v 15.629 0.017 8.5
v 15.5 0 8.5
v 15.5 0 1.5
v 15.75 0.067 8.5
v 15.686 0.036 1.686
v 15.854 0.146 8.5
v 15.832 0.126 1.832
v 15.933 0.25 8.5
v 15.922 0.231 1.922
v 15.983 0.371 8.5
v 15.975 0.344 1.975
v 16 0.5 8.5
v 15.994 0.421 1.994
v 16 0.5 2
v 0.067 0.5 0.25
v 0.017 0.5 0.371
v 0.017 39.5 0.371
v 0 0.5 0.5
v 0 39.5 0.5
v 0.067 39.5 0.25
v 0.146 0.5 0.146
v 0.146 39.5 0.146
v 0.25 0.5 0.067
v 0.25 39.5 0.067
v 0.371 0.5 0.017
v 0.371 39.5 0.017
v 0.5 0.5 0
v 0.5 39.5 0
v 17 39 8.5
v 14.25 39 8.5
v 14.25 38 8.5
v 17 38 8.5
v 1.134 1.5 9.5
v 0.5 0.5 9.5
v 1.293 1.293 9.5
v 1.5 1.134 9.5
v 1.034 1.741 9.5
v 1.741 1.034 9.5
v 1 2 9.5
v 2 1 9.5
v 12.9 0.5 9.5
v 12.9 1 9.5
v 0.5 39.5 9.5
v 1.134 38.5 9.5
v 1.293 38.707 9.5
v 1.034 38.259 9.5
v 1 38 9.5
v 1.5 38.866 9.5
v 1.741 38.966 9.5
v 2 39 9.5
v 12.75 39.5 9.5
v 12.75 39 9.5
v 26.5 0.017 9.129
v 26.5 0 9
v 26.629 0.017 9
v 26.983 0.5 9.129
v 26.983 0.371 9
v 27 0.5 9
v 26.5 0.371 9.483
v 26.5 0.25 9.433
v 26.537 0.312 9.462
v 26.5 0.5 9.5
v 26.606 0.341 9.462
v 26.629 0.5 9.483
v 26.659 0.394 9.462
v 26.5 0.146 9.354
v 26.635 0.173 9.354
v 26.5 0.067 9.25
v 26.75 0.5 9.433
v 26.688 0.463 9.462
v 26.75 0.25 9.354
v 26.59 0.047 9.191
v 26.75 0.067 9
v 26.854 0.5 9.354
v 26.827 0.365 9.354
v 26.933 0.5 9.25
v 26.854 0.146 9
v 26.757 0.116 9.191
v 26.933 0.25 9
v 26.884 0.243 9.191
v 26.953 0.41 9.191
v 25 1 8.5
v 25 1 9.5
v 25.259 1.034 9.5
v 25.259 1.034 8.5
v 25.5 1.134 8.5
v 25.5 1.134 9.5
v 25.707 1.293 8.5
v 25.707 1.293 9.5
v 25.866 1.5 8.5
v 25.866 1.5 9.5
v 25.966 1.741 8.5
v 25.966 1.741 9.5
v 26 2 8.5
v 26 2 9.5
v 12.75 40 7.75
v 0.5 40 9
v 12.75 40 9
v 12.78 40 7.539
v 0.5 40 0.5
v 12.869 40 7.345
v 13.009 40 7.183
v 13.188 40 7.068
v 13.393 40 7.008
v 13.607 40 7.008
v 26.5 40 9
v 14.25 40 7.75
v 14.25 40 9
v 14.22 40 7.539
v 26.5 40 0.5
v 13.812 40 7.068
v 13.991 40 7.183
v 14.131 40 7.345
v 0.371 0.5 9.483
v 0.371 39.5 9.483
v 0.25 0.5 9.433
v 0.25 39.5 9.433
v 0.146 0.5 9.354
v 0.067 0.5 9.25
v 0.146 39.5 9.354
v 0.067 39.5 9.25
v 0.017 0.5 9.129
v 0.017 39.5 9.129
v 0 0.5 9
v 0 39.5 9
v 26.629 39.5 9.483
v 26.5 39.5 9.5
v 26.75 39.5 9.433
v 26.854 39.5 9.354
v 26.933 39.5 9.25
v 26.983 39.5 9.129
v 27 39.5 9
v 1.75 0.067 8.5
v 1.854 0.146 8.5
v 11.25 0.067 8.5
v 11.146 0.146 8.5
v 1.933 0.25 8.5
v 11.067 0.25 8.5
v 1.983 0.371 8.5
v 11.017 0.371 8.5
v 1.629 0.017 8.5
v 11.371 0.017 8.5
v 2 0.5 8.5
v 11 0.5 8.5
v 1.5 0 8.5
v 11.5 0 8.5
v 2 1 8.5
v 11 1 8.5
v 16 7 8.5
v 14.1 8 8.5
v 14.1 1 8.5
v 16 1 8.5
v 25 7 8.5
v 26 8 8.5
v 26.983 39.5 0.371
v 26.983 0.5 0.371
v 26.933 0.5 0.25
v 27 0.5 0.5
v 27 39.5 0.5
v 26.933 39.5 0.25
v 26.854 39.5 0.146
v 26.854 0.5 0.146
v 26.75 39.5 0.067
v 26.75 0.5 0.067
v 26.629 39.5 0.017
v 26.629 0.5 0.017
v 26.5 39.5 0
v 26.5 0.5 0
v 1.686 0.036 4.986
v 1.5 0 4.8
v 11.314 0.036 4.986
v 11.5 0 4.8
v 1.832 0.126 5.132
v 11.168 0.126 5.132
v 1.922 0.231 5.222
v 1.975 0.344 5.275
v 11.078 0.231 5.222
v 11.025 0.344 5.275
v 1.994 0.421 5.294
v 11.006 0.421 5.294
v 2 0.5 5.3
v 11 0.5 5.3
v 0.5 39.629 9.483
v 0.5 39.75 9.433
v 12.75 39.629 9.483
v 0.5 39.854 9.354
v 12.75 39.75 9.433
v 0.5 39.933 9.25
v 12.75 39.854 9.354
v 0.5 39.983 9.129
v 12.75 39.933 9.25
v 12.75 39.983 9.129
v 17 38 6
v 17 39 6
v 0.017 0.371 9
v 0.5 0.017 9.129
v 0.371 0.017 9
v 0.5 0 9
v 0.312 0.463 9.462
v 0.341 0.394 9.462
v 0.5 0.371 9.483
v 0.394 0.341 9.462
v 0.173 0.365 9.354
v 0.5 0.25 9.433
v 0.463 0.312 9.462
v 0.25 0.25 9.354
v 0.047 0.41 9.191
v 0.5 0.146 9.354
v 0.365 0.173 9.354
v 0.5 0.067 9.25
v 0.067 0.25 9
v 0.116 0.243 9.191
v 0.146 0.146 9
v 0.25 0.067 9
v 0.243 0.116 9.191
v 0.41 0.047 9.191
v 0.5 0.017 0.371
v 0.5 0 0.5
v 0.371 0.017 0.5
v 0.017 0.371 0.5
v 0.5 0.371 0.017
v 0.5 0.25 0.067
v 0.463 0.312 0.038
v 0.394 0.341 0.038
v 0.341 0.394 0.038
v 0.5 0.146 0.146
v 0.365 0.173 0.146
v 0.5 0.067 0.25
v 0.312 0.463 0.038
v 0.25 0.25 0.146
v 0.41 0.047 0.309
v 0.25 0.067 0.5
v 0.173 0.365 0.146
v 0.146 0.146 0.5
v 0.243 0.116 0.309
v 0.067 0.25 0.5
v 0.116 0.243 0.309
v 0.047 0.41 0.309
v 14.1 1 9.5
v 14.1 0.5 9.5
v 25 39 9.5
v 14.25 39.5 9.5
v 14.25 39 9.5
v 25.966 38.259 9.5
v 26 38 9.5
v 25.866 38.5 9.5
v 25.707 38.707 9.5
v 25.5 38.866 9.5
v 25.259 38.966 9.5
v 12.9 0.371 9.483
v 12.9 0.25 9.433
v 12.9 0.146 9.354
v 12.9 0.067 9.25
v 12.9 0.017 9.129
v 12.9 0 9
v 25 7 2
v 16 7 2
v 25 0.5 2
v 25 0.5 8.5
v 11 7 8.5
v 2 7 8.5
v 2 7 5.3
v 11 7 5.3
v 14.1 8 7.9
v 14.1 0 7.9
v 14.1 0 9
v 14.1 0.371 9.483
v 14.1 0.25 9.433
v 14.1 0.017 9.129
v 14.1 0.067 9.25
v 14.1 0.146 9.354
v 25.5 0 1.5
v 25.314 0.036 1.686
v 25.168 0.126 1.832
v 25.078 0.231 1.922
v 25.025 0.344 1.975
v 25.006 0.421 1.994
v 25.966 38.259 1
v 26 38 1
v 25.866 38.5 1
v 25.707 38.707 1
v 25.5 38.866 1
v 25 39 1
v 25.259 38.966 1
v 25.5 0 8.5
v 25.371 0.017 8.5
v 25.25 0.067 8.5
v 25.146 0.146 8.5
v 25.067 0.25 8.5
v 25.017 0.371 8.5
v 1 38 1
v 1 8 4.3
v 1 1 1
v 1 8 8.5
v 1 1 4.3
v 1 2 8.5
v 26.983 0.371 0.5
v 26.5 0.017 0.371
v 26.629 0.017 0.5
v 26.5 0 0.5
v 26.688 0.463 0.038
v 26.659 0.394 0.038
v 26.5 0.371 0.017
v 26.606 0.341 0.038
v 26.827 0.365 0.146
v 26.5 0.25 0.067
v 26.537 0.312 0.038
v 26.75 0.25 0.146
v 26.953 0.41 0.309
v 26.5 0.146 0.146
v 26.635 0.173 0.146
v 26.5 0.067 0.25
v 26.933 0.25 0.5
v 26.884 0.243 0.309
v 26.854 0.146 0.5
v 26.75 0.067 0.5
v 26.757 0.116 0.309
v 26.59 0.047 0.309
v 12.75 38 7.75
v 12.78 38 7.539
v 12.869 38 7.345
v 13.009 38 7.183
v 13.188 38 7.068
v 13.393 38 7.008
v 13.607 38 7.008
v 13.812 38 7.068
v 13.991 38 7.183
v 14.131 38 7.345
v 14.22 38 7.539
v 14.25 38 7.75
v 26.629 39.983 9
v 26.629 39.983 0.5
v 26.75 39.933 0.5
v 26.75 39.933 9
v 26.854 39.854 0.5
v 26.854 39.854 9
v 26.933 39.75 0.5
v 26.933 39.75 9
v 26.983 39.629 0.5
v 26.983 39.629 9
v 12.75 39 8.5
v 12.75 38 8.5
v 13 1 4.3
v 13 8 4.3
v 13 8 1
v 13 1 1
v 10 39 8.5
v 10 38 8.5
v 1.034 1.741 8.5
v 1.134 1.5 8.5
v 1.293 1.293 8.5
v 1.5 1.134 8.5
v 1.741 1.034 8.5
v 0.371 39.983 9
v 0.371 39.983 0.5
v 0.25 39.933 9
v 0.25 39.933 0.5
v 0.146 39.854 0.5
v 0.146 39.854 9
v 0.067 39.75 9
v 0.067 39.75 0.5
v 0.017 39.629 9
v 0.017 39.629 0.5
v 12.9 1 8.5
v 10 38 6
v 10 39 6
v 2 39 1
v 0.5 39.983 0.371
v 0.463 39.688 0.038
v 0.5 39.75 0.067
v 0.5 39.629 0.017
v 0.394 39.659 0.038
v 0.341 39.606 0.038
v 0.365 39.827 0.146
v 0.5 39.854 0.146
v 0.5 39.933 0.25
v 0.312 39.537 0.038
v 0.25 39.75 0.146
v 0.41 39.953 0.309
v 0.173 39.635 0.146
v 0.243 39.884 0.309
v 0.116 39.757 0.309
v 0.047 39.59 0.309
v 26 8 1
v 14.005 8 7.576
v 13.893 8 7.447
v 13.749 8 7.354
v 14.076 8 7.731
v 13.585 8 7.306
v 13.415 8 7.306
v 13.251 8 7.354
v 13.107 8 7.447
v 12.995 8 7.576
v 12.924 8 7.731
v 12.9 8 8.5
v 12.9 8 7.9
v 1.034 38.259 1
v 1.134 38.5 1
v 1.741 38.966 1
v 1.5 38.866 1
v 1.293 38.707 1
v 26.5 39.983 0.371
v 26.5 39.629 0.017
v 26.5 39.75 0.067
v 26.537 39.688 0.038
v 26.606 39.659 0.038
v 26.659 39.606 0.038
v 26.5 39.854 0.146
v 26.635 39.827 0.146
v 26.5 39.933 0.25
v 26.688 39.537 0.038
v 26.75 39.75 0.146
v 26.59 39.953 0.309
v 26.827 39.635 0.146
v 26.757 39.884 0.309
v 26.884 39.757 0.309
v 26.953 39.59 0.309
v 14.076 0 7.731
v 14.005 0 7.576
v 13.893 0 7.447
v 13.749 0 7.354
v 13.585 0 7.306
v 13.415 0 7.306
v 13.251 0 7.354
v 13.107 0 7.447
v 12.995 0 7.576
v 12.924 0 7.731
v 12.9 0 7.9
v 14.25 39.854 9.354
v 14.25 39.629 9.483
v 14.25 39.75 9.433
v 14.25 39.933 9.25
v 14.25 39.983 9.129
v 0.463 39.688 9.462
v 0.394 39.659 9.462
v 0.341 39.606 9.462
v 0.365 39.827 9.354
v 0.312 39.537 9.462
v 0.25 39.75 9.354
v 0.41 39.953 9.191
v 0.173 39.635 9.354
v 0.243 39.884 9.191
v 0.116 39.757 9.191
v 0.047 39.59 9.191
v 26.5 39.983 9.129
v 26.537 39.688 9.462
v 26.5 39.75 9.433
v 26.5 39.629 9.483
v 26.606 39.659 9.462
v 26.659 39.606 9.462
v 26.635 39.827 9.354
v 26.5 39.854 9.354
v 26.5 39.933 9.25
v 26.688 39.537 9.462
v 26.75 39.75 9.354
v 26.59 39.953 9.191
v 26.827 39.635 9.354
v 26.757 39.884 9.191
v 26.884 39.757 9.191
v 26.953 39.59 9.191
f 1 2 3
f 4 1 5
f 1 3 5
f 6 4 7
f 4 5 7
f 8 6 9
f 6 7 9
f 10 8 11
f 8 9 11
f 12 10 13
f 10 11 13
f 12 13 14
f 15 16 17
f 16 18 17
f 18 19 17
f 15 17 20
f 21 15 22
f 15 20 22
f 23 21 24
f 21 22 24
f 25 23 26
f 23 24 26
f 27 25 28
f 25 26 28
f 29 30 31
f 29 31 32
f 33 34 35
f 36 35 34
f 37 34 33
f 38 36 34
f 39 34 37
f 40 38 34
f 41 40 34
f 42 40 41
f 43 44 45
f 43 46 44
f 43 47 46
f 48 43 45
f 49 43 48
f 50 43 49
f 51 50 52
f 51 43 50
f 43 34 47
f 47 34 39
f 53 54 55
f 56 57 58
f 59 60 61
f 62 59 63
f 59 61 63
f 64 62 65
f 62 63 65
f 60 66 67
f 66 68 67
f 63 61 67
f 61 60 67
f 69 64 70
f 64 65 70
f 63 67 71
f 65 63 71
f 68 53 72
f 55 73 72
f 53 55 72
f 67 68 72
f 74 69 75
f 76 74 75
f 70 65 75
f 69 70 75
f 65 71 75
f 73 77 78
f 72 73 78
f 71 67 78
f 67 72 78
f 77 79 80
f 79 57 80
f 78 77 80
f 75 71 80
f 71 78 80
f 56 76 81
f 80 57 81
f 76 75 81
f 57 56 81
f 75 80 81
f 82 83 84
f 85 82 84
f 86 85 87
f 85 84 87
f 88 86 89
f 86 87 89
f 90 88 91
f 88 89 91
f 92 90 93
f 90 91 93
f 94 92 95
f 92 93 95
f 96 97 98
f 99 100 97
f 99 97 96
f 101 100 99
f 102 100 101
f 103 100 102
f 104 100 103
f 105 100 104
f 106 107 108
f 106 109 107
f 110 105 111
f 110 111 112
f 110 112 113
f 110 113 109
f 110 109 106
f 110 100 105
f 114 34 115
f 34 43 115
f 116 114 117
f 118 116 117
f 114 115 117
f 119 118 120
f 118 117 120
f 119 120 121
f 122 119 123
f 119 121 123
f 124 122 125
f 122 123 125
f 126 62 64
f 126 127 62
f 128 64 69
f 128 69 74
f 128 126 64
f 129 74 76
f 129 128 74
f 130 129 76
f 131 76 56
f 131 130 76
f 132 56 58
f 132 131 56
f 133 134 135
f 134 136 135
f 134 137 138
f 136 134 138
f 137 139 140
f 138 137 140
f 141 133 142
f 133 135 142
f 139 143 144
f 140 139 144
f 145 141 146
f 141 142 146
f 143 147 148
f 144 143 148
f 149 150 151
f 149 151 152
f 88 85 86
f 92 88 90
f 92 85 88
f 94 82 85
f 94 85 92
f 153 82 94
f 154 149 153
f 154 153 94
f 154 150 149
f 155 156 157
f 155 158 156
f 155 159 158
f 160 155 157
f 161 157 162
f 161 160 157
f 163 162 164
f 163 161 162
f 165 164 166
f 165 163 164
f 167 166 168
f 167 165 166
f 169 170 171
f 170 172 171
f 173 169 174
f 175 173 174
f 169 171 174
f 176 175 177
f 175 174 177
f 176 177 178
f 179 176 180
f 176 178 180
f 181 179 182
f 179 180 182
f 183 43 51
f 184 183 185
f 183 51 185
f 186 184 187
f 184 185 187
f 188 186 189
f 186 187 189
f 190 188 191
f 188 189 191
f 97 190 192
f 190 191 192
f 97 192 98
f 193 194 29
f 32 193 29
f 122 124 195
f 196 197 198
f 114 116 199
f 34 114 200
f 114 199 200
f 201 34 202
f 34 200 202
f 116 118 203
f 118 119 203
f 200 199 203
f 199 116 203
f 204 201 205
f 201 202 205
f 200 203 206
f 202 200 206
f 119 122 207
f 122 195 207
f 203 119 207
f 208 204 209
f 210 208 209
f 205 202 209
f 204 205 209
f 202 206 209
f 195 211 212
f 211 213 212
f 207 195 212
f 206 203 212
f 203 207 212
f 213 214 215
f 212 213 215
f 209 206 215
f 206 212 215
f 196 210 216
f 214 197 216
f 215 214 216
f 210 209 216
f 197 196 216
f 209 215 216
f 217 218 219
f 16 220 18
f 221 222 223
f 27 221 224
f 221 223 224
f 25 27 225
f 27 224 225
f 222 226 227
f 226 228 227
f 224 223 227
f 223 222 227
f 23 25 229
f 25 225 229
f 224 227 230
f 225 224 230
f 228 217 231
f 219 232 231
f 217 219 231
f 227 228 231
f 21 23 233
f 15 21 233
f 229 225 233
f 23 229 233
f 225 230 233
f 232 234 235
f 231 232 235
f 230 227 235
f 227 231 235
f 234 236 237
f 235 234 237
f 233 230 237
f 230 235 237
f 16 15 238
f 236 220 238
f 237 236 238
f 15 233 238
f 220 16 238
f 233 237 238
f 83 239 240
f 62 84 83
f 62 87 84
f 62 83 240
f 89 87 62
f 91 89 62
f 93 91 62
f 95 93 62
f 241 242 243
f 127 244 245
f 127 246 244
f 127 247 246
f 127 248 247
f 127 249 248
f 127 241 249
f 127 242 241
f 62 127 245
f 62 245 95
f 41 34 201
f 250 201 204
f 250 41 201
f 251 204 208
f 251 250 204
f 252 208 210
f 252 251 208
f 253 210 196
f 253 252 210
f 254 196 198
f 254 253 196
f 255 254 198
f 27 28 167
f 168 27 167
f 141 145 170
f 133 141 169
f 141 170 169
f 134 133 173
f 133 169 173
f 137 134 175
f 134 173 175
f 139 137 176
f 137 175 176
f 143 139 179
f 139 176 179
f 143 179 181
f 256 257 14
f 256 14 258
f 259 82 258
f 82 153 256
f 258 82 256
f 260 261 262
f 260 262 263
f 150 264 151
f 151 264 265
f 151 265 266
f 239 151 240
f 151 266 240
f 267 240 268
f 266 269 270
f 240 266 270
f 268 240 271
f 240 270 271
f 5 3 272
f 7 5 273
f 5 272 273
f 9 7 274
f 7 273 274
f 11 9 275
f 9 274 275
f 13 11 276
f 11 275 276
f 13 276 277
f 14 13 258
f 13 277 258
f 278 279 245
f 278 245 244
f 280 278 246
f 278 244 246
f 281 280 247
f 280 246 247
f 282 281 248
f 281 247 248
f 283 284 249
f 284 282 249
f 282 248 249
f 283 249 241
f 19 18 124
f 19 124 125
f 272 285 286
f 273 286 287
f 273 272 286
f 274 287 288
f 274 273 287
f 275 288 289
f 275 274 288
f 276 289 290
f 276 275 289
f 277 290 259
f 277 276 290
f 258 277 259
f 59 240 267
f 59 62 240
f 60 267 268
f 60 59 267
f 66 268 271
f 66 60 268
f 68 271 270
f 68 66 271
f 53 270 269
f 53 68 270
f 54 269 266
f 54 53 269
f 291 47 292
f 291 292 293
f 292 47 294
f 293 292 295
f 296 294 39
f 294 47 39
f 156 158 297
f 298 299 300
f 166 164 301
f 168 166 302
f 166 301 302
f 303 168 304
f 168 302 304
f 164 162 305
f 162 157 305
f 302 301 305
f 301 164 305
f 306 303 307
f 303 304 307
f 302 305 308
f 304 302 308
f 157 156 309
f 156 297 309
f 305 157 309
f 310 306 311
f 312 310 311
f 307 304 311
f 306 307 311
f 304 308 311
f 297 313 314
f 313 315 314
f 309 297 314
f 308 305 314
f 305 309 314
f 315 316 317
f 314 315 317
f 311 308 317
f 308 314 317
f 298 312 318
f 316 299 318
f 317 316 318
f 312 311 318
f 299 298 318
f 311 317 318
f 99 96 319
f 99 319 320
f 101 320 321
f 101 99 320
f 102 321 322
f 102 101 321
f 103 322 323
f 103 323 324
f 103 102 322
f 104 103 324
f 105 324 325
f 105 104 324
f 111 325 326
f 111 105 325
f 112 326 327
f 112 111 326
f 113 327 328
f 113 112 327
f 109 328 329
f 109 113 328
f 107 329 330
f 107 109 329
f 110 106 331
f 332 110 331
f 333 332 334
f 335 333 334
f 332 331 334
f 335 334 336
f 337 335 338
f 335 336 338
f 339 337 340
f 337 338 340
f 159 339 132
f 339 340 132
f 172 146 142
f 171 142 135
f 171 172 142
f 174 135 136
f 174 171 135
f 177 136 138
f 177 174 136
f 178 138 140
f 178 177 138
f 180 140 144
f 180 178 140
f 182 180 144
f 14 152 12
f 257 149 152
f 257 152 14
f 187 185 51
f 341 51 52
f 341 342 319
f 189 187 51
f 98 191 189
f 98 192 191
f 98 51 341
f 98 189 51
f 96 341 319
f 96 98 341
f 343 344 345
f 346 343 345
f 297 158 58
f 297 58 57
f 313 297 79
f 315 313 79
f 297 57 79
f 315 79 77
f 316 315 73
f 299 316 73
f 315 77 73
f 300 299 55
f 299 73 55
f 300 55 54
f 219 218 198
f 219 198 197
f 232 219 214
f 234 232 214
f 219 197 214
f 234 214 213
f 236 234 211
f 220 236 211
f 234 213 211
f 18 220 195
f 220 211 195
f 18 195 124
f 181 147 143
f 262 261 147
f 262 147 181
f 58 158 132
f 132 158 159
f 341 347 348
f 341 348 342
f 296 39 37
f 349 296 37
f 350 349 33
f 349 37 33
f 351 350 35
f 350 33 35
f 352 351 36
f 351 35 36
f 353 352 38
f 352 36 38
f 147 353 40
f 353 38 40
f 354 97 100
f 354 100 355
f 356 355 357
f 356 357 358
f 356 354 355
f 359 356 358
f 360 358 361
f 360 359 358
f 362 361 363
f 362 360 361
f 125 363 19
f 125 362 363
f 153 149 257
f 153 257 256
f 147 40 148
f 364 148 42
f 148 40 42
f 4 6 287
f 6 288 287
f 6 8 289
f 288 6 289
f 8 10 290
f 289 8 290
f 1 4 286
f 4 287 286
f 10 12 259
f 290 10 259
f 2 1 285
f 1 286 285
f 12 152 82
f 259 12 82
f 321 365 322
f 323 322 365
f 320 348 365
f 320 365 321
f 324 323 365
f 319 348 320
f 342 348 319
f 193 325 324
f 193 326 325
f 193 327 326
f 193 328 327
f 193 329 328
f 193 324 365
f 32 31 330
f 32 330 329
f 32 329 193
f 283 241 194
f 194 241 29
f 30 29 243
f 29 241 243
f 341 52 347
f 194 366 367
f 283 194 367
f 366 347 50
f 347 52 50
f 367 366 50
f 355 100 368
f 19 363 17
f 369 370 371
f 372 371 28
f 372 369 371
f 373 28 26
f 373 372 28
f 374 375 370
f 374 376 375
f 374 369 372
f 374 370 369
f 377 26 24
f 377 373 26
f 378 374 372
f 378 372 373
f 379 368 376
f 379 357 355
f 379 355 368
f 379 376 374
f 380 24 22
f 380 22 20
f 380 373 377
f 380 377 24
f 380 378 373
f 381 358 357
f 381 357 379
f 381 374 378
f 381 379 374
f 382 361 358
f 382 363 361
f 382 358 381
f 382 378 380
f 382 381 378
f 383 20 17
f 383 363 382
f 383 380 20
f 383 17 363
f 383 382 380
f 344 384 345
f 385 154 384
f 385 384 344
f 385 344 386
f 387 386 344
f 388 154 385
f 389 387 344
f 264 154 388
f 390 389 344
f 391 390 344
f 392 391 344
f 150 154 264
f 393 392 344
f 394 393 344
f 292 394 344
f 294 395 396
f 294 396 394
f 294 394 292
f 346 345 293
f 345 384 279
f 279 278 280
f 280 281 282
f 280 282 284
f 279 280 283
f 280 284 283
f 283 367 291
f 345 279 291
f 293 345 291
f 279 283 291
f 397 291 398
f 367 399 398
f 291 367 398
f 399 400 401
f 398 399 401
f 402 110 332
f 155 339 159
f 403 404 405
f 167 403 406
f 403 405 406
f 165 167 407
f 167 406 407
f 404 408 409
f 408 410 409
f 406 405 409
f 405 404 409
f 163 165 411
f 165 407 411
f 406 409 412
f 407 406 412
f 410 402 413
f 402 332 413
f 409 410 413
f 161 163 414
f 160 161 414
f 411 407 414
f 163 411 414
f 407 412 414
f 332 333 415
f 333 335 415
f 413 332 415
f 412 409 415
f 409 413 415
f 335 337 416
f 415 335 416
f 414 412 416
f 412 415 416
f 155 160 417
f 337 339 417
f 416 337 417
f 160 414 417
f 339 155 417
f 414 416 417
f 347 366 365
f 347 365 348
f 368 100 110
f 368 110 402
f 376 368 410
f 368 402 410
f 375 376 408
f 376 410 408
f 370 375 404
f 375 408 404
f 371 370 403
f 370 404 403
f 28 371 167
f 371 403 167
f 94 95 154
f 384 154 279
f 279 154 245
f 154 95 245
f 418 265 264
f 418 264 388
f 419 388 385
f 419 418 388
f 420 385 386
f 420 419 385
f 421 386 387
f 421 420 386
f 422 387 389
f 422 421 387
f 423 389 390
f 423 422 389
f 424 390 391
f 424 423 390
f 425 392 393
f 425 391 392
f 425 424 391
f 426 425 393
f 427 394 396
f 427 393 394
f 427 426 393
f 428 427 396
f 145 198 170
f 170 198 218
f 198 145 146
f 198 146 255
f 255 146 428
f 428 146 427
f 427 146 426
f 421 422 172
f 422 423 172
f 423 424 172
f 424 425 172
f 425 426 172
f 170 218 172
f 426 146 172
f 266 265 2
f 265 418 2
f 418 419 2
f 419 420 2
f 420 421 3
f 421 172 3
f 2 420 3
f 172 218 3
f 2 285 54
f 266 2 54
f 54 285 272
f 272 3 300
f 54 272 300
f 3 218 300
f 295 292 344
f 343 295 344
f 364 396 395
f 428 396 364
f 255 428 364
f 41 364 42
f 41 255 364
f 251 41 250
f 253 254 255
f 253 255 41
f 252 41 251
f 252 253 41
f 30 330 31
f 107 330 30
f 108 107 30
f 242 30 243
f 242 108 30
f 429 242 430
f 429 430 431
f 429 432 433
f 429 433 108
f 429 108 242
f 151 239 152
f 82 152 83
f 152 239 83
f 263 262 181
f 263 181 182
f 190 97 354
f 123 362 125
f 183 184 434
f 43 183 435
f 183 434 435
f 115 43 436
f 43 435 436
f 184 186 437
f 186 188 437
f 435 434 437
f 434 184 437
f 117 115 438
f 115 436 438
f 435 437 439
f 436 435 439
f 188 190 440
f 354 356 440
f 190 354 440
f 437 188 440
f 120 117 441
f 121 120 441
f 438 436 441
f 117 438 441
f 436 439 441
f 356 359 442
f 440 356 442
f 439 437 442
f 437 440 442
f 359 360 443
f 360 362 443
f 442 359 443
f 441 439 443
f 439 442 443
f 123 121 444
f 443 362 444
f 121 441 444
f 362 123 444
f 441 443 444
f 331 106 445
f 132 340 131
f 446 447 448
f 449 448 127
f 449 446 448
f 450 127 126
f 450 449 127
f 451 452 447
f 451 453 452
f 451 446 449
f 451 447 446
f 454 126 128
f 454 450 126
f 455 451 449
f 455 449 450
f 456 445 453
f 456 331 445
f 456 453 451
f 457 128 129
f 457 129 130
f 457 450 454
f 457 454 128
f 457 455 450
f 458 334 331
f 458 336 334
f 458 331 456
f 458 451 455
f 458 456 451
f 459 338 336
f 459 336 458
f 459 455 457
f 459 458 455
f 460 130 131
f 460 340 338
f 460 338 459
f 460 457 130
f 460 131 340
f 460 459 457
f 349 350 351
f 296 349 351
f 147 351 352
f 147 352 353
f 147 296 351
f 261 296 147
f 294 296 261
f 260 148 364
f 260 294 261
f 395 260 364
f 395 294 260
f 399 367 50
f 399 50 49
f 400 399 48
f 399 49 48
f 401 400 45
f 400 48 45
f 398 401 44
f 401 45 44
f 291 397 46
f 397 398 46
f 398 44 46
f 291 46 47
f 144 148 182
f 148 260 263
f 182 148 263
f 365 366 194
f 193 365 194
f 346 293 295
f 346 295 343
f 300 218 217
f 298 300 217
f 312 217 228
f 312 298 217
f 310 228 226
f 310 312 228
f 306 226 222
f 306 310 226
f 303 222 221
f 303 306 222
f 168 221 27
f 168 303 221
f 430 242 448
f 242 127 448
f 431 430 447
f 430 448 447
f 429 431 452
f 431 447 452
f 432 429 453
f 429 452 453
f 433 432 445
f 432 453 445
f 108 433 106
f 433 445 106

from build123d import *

# Parameters (mm, degrees)
SKETCH_2_W           = 27
SKETCH_2_H           = 40
EXTRUDE_1_DEPTH      = 10
CUT_EXTRUDE_1_DEPTH  = 1.5
CUT_EXTRUDE_2_DEPTH  = 7.5
SKETCH_9_W           = 9
SKETCH_9_H           = 4.718038217
CUT_EXTRUDE_8_DEPTH  = 6.5
SKETCH_9_3_W         = 9
SKETCH_9_3_H         = 4.718038217
CUT_EXTRUDE_9_DEPTH  = 3.2
SKETCH_13_W          = 9
SKETCH_13_H          = 3.2
SKETCH_13_H_2        = 6.5
CUT_EXTRUDE_11_DEPTH = 3.281961783
CUT_EXTRUDE_12_REACH = 42
SKETCH_14_W          = 1.2
SKETCH_14_H          = 2.1
SKETCH_16_2_W        = 7
SKETCH_16_2_H        = 2.5
EXTRUDE_3_DEPTH      = 1
SKETCH_16_W          = 7
SKETCH_16_H          = 2.5
EXTRUDE_2_DEPTH      = 1
CUT_EXTRUDE_14_DEPTH = 2
SKETCH_18_W          = 12
SKETCH_18_H          = 3.3
CUT_EXTRUDE_15_DEPTH = 7
SKETCH_19_W          = 27
SKETCH_19_H          = 40
CUT_EXTRUDE_16_DEPTH = 0.5
FILLET_1_R           = 0.5
FILLET_2_R           = 0.5


with BuildPart() as part:
    # Sketch 2 → Extrude 1 (new body)
    with BuildSketch(Plane.XY):
        with Locations((13.5, 20)):
            Rectangle(SKETCH_2_W, SKETCH_2_H)
    extrude(amount=EXTRUDE_1_DEPTH)

    # Sketch 3 → Cut-Extrude 1 (cut)
    with BuildSketch(Plane.XY.offset(10)):
        with BuildLine():
            Line((1, 38), (1, 2))
            ThreePointArc((1, 2), (1.292893219, 1.292893219), (2, 1))
            Line((2, 1), (25, 1))
            ThreePointArc((25, 1), (25.707106781, 1.292893219), (26, 2))
            Line((26, 2), (26, 38))
            ThreePointArc((26, 38), (25.707106781, 38.707106781), (25, 39))
            Line((25, 39), (2, 39))
            ThreePointArc((2, 39), (1.292893219, 38.707106781), (1, 38))
        make_face()
    extrude(amount=-CUT_EXTRUDE_1_DEPTH, mode=Mode.SUBTRACT)

    # Sketch 5 → Cut-Extrude 2 (cut)
    with BuildSketch(Plane.XY.offset(8.5)):
        with BuildLine():
            Line((2, 39), (25, 39))
            ThreePointArc((25, 39), (25.707106781, 38.707106781), (26, 38))
            Line((26, 38), (26, 8))
            Line((26, 8), (1, 8))
            Line((1, 8), (1, 38))
            ThreePointArc((1, 38), (1.292893219, 38.707106781), (2, 39))
        make_face()
    extrude(amount=-CUT_EXTRUDE_2_DEPTH, mode=Mode.SUBTRACT)

    # Sketch 9 → Cut-Extrude 8 (cut)
    with BuildSketch(Plane.XY.offset(8.5)):
        with Locations((20.5, 4.640980891)):
            Rectangle(SKETCH_9_W, SKETCH_9_H)
    extrude(amount=-CUT_EXTRUDE_8_DEPTH, mode=Mode.SUBTRACT)

    # Sketch 9_3 → Cut-Extrude 9 (cut)
    with BuildSketch(Plane.XY.offset(8.5)):
        with Locations((6.5, 4.640980891)):
            Rectangle(SKETCH_9_3_W, SKETCH_9_3_H)
    extrude(amount=-CUT_EXTRUDE_9_DEPTH, mode=Mode.SUBTRACT)

    # Sketch 13 → Cut-Extrude 11 (cut, through all)
    with BuildSketch(Plane(origin=(0, 2.281961783, 0), x_dir=(1, 0, 0), z_dir=(0, 1, 0))):
        with Locations((6.5, -6.9)):
            Rectangle(SKETCH_13_W, SKETCH_13_H)
        with Locations((20.5, -5.25)):
            Rectangle(SKETCH_13_W, SKETCH_13_H_2)
    extrude(amount=-CUT_EXTRUDE_11_DEPTH, mode=Mode.SUBTRACT)

    # Sketch 14 → Cut-Extrude 12 (cut, up to next)
    with BuildSketch(Plane.XZ, mode=Mode.PRIVATE) as cut_extrude_12_sk1:
        with BuildLine():
            Line((12.9, 7.9), (14.1, 7.9))
            ThreePointArc((14.1, 7.9), (13.5, 7.3), (12.9, 7.9))
        make_face()
    cut_extrude_12_tool1 = extrude(cut_extrude_12_sk1.sketch, amount=-CUT_EXTRUDE_12_REACH, mode=Mode.PRIVATE) & part.part
    add(cut_extrude_12_tool1.solids().sort_by_distance((13.5, 0, 7.645352))[0], mode=Mode.SUBTRACT)
    # Sketch 14 → Cut-Extrude 12 (cut, up to next)
    with BuildSketch(Plane.XZ, mode=Mode.PRIVATE) as cut_extrude_12_sk2:
        with Locations((13.5, 8.95)):
            Rectangle(SKETCH_14_W, SKETCH_14_H)
    cut_extrude_12_tool2 = extrude(cut_extrude_12_sk2.sketch, amount=-CUT_EXTRUDE_12_REACH, mode=Mode.PRIVATE) & part.part
    add(cut_extrude_12_tool2.solids().sort_by_distance((13.5, 0, 8.95))[0], mode=Mode.SUBTRACT)

    # Sketch 16_2 → Extrude 3 (add)
    with BuildSketch(Plane.XZ.offset(-39)):
        with Locations((13.5, 7.25)):
            Rectangle(SKETCH_16_2_W, SKETCH_16_2_H)
    extrude(amount=EXTRUDE_3_DEPTH)

    # Sketch 16 → Extrude 2 (add)
    with BuildSketch(Plane.XZ.offset(-39)):
        with Locations((13.5, 7.25)):
            Rectangle(SKETCH_16_W, SKETCH_16_H)
    extrude(amount=EXTRUDE_2_DEPTH)

    # Sketch 17 → Cut-Extrude 14 (cut)
    with BuildSketch(Plane(origin=(0, 40, 0), x_dir=(1, 0, 0), z_dir=(0, 1, 0))):
        with BuildLine():
            Line((14.25, -7.75), (14.25, -10))
            Line((14.25, -10), (12.75, -10))
            Line((12.75, -10), (12.75, -7.75))
            ThreePointArc((12.75, -7.75), (13.5, -7), (14.25, -7.75))
        make_face()
    extrude(amount=-CUT_EXTRUDE_14_DEPTH, mode=Mode.SUBTRACT)

    # Sketch 18 → Cut-Extrude 15 (cut)
    with BuildSketch(Plane(origin=(0, 8, 0), x_dir=(1, 0, 0), z_dir=(0, 1, 0))):
        with Locations((7, -2.65)):
            Rectangle(SKETCH_18_W, SKETCH_18_H)
    extrude(amount=-CUT_EXTRUDE_15_DEPTH, mode=Mode.SUBTRACT)

    # Sketch 19 → Cut-Extrude 16 (cut)
    with BuildSketch(Plane.XY.offset(10)):
        with Locations((13.5, 20)):
            Rectangle(SKETCH_19_W, SKETCH_19_H)
    extrude(amount=-CUT_EXTRUDE_16_DEPTH, mode=Mode.SUBTRACT)

    # Fillet 1
    fillet_1_edges = [part.edges().sort_by_distance(p)[0] for p in [
        (27, 40, 4.75),
        (0, 40, 4.75),
        (27, 0, 4.75),
        (0, 0, 4.75),
        (20.55, 0, 9.5),
        (20.625, 40, 9.5),
        (6.375, 40, 9.5),
        (0, 20, 9.5),
        (27, 20, 9.5),
        (6.45, 0, 9.5),
        (13.5, 40, 0),
        (27, 20, 0),
        (13.5, 0, 0),
        (0, 20, 0),
    ]]
    fillet(fillet_1_edges, radius=FILLET_1_R)

    # Fillet 2
    fillet_2_edges = [part.edges().sort_by_distance(p)[0] for p in [
        (11, 0, 6.9),
        (2, 0, 6.9),
        (6.5, 0, 5.3),
        (25, 0, 5.25),
        (16, 0, 5.25),
        (20.5, 0, 2),
    ]]
    fillet(fillet_2_edges, radius=FILLET_2_R)


solid = part.part
